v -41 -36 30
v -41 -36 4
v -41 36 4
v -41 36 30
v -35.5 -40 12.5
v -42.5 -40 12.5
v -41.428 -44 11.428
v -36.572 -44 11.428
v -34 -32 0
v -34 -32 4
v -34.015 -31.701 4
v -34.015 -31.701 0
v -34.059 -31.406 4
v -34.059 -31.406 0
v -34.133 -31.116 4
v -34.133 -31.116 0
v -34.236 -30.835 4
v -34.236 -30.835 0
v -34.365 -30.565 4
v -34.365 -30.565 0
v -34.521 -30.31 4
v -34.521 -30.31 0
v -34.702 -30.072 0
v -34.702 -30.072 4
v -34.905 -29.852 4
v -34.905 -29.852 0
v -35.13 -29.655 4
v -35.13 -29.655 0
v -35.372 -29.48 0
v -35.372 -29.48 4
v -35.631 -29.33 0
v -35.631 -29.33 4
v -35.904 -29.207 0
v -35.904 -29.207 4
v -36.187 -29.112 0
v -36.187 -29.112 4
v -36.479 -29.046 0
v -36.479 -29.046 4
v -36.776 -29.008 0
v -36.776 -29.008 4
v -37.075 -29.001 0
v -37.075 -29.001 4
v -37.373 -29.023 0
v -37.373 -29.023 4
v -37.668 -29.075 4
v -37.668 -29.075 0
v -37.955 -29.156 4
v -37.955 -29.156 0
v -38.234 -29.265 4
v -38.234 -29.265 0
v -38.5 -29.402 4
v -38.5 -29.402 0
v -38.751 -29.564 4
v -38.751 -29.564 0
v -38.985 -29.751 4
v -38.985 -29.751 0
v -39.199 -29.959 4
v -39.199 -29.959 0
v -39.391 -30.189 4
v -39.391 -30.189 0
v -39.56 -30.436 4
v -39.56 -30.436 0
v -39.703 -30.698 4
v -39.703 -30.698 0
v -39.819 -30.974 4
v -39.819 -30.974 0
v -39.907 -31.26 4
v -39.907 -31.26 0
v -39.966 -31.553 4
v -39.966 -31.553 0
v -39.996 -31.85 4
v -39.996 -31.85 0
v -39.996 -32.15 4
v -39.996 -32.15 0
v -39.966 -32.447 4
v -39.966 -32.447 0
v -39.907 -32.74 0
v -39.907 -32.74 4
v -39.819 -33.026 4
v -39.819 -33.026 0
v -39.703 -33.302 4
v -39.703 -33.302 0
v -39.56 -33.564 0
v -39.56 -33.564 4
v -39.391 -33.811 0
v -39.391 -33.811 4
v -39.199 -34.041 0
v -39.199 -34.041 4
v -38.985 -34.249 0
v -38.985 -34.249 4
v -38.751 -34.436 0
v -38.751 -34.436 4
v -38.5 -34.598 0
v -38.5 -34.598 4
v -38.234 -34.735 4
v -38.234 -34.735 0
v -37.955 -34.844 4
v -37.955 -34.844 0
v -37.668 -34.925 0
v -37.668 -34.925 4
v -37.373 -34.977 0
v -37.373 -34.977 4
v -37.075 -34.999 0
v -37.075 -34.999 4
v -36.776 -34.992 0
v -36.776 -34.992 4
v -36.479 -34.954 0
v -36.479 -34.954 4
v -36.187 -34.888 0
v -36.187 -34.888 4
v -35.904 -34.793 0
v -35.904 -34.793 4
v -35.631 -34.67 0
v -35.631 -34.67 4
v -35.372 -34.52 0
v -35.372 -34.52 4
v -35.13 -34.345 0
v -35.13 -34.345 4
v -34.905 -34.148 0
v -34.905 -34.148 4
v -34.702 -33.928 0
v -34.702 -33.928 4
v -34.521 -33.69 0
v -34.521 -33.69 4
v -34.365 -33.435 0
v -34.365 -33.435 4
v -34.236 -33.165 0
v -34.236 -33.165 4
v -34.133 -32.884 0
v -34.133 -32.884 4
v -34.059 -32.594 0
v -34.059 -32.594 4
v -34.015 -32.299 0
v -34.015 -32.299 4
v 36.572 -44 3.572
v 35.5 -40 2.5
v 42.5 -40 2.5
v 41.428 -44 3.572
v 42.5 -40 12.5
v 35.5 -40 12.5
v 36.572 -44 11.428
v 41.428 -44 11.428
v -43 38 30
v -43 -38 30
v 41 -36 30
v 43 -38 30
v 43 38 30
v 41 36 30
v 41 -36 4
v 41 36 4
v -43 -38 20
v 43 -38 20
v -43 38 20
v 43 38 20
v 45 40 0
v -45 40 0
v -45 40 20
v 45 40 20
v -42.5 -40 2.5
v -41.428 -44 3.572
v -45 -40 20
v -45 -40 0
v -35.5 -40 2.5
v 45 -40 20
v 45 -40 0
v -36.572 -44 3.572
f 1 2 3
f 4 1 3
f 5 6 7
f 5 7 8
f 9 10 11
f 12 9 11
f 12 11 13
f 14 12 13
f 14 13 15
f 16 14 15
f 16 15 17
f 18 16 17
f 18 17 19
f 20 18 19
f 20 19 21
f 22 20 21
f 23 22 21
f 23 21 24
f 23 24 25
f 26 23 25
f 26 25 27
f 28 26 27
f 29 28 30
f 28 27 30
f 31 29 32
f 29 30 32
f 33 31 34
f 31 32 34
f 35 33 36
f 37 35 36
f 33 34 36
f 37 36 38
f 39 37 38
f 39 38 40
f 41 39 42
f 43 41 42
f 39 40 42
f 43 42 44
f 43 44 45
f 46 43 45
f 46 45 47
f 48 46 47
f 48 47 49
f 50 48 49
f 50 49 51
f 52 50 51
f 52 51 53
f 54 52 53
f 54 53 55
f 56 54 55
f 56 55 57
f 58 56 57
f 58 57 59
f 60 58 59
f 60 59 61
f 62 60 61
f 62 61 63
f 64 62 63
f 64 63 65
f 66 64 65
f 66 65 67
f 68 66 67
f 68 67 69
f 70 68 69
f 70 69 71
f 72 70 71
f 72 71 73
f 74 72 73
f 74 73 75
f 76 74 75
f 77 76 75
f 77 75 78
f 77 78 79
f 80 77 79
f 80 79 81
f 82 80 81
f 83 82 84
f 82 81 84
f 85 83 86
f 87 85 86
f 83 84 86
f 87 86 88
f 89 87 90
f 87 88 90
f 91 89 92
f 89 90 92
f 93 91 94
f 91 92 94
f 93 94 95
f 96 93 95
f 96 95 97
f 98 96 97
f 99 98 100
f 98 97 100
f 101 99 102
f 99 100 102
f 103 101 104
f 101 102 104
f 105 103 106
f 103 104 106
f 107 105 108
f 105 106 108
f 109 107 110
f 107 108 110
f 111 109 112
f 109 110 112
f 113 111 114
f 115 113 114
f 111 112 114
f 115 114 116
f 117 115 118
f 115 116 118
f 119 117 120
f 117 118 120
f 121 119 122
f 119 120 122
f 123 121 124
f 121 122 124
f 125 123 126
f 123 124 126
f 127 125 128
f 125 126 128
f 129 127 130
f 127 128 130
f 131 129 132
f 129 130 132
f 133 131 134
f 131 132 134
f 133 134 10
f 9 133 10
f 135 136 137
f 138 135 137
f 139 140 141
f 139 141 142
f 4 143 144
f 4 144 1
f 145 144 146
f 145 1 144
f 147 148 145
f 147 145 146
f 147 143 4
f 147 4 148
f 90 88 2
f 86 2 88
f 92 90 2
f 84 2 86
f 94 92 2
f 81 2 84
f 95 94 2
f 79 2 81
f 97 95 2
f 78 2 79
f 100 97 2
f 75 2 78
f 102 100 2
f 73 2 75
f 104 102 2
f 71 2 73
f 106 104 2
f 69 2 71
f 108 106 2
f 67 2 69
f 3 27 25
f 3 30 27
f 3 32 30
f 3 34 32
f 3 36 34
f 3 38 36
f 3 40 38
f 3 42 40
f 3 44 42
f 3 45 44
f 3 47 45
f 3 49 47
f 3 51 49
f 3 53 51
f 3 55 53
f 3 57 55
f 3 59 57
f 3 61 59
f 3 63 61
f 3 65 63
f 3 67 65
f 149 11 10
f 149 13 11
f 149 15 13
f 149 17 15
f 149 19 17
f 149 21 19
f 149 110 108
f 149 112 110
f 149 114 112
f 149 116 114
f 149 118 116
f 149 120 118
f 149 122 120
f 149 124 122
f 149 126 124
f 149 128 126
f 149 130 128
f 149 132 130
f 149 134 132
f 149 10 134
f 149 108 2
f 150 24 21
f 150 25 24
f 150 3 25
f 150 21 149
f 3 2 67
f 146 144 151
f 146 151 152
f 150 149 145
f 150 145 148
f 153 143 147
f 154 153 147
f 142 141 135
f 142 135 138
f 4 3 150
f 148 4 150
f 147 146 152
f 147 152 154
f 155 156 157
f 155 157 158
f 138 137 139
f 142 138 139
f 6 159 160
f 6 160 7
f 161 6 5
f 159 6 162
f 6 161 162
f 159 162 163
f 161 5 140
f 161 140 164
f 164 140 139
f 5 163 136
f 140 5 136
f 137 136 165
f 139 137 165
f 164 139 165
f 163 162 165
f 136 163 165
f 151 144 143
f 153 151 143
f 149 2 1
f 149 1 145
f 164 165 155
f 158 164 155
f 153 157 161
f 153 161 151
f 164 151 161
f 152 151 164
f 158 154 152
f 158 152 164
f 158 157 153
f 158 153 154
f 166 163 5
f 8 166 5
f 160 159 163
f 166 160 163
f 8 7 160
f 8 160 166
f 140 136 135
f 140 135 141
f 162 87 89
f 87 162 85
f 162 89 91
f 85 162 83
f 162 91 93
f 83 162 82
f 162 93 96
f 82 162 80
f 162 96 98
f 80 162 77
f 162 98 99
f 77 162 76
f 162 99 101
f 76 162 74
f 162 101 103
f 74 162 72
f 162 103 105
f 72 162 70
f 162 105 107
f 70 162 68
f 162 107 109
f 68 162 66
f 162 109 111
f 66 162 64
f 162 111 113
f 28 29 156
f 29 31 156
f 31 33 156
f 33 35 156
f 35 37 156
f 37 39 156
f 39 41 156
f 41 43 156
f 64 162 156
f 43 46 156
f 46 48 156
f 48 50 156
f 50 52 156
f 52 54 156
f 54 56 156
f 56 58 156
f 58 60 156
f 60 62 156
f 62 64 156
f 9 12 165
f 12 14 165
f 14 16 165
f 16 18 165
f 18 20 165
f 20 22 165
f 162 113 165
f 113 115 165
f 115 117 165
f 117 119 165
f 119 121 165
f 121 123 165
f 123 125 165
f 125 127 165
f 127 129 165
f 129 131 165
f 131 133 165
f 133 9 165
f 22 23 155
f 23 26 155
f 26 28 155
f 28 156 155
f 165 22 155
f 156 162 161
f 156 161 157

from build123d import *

# Parameters (mm, degrees)
SKETCH1_W                     = 90
SKETCH1_H                     = 80
BOSS_EXTRUDE1_DEPTH           = 30
SHELL1_T                      = -4
SKETCH4_W                     = 7
SKETCH4_H                     = 10
BOSS_EXTRUDE2_DEPTH           = 4
BOSS_EXTRUDE2_DRAFT           = 15
BOSS_EXTRUDE2_PROFILE_2_DEPTH = 4
BOSS_EXTRUDE2_PROFILE_2_DRAFT = 15
SKETCH6_R                     = 3
CUT_EXTRUDE3_DEPTH            = 10
SKETCH8_W                     = 90
SKETCH8_H                     = 80
SKETCH8_W_2                   = 86
SKETCH8_H_2                   = 76
CUT_EXTRUDE4_DEPTH            = 10


with BuildPart() as part:
    # Sketch1 → Boss-Extrude1 (new body)
    with BuildSketch(Plane.XY):
        Rectangle(SKETCH1_W, SKETCH1_H)
    extrude(amount=BOSS_EXTRUDE1_DEPTH)

    # Shell1
    shell1_openings = [part.faces().sort_by_distance(p)[0] for p in [
        (0, 0, 30),
    ]]
    offset(amount=SHELL1_T, openings=shell1_openings, kind=Kind.INTERSECTION)


with BuildPart() as boss_extrude2_tool:
    # Sketch4 → Boss-Extrude2 (with draft: the straight prism first)
    with BuildSketch(Plane.XZ.offset(40)):
        with Locations((-39, 7.5)):
            Rectangle(SKETCH4_W, SKETCH4_H)
    extrude(amount=BOSS_EXTRUDE2_DEPTH)
    # Boss-Extrude2: the draft: its side faces are tilted about the plane it starts from
    boss_extrude2_sides = [boss_extrude2_tool.faces().sort_by_distance(p)[0] for p in [
        (-42.5, -42, 7.5),
        (-39, -42, 2.5),
        (-35.5, -42, 7.5),
        (-39, -42, 12.5),
    ]]
    draft(boss_extrude2_sides, Plane.XZ.offset(40), BOSS_EXTRUDE2_DRAFT)


with BuildPart() as part_1:
    add(part.part)

    # Boss-Extrude2: add boss_extrude2_tool
    add(boss_extrude2_tool.part)


with BuildPart() as boss_extrude2_profile_2_tool:
    # Sketch4 → Boss-Extrude2 profile 2 (with draft: the straight prism first)
    with BuildSketch(Plane.XZ.offset(40)):
        with Locations((39, 7.5)):
            Rectangle(SKETCH4_W, SKETCH4_H)
    extrude(amount=BOSS_EXTRUDE2_PROFILE_2_DEPTH)
    # Boss-Extrude2 profile 2: the draft: its side faces are tilted about the plane it starts from
    boss_extrude2_profile_2_sides = [boss_extrude2_profile_2_tool.faces().sort_by_distance(p)[0] for p in [
        (35.5, -42, 7.5),
        (39, -42, 2.5),
        (42.5, -42, 7.5),
        (39, -42, 12.5),
    ]]
    draft(boss_extrude2_profile_2_sides, Plane.XZ.offset(40), BOSS_EXTRUDE2_PROFILE_2_DRAFT)


with BuildPart() as part_2:
    add(part_1.part)

    # Boss-Extrude2 profile 2: add boss_extrude2_profile_2_tool
    add(boss_extrude2_profile_2_tool.part)

    # Sketch6 → Cut-Extrude3 (cut)
    with BuildSketch(Plane.XY.offset(4)):
        with Locations((-37, -32)):
            Circle(SKETCH6_R)
    extrude(amount=-CUT_EXTRUDE3_DEPTH, mode=Mode.SUBTRACT)

    # Sketch8 → Cut-Extrude4 (cut)
    with BuildSketch(Plane.XY.offset(30)):
        Rectangle(SKETCH8_W, SKETCH8_H)
        Rectangle(SKETCH8_W_2, SKETCH8_H_2, mode=Mode.SUBTRACT)
    extrude(amount=-CUT_EXTRUDE4_DEPTH, mode=Mode.SUBTRACT)


solid = part_2.part
